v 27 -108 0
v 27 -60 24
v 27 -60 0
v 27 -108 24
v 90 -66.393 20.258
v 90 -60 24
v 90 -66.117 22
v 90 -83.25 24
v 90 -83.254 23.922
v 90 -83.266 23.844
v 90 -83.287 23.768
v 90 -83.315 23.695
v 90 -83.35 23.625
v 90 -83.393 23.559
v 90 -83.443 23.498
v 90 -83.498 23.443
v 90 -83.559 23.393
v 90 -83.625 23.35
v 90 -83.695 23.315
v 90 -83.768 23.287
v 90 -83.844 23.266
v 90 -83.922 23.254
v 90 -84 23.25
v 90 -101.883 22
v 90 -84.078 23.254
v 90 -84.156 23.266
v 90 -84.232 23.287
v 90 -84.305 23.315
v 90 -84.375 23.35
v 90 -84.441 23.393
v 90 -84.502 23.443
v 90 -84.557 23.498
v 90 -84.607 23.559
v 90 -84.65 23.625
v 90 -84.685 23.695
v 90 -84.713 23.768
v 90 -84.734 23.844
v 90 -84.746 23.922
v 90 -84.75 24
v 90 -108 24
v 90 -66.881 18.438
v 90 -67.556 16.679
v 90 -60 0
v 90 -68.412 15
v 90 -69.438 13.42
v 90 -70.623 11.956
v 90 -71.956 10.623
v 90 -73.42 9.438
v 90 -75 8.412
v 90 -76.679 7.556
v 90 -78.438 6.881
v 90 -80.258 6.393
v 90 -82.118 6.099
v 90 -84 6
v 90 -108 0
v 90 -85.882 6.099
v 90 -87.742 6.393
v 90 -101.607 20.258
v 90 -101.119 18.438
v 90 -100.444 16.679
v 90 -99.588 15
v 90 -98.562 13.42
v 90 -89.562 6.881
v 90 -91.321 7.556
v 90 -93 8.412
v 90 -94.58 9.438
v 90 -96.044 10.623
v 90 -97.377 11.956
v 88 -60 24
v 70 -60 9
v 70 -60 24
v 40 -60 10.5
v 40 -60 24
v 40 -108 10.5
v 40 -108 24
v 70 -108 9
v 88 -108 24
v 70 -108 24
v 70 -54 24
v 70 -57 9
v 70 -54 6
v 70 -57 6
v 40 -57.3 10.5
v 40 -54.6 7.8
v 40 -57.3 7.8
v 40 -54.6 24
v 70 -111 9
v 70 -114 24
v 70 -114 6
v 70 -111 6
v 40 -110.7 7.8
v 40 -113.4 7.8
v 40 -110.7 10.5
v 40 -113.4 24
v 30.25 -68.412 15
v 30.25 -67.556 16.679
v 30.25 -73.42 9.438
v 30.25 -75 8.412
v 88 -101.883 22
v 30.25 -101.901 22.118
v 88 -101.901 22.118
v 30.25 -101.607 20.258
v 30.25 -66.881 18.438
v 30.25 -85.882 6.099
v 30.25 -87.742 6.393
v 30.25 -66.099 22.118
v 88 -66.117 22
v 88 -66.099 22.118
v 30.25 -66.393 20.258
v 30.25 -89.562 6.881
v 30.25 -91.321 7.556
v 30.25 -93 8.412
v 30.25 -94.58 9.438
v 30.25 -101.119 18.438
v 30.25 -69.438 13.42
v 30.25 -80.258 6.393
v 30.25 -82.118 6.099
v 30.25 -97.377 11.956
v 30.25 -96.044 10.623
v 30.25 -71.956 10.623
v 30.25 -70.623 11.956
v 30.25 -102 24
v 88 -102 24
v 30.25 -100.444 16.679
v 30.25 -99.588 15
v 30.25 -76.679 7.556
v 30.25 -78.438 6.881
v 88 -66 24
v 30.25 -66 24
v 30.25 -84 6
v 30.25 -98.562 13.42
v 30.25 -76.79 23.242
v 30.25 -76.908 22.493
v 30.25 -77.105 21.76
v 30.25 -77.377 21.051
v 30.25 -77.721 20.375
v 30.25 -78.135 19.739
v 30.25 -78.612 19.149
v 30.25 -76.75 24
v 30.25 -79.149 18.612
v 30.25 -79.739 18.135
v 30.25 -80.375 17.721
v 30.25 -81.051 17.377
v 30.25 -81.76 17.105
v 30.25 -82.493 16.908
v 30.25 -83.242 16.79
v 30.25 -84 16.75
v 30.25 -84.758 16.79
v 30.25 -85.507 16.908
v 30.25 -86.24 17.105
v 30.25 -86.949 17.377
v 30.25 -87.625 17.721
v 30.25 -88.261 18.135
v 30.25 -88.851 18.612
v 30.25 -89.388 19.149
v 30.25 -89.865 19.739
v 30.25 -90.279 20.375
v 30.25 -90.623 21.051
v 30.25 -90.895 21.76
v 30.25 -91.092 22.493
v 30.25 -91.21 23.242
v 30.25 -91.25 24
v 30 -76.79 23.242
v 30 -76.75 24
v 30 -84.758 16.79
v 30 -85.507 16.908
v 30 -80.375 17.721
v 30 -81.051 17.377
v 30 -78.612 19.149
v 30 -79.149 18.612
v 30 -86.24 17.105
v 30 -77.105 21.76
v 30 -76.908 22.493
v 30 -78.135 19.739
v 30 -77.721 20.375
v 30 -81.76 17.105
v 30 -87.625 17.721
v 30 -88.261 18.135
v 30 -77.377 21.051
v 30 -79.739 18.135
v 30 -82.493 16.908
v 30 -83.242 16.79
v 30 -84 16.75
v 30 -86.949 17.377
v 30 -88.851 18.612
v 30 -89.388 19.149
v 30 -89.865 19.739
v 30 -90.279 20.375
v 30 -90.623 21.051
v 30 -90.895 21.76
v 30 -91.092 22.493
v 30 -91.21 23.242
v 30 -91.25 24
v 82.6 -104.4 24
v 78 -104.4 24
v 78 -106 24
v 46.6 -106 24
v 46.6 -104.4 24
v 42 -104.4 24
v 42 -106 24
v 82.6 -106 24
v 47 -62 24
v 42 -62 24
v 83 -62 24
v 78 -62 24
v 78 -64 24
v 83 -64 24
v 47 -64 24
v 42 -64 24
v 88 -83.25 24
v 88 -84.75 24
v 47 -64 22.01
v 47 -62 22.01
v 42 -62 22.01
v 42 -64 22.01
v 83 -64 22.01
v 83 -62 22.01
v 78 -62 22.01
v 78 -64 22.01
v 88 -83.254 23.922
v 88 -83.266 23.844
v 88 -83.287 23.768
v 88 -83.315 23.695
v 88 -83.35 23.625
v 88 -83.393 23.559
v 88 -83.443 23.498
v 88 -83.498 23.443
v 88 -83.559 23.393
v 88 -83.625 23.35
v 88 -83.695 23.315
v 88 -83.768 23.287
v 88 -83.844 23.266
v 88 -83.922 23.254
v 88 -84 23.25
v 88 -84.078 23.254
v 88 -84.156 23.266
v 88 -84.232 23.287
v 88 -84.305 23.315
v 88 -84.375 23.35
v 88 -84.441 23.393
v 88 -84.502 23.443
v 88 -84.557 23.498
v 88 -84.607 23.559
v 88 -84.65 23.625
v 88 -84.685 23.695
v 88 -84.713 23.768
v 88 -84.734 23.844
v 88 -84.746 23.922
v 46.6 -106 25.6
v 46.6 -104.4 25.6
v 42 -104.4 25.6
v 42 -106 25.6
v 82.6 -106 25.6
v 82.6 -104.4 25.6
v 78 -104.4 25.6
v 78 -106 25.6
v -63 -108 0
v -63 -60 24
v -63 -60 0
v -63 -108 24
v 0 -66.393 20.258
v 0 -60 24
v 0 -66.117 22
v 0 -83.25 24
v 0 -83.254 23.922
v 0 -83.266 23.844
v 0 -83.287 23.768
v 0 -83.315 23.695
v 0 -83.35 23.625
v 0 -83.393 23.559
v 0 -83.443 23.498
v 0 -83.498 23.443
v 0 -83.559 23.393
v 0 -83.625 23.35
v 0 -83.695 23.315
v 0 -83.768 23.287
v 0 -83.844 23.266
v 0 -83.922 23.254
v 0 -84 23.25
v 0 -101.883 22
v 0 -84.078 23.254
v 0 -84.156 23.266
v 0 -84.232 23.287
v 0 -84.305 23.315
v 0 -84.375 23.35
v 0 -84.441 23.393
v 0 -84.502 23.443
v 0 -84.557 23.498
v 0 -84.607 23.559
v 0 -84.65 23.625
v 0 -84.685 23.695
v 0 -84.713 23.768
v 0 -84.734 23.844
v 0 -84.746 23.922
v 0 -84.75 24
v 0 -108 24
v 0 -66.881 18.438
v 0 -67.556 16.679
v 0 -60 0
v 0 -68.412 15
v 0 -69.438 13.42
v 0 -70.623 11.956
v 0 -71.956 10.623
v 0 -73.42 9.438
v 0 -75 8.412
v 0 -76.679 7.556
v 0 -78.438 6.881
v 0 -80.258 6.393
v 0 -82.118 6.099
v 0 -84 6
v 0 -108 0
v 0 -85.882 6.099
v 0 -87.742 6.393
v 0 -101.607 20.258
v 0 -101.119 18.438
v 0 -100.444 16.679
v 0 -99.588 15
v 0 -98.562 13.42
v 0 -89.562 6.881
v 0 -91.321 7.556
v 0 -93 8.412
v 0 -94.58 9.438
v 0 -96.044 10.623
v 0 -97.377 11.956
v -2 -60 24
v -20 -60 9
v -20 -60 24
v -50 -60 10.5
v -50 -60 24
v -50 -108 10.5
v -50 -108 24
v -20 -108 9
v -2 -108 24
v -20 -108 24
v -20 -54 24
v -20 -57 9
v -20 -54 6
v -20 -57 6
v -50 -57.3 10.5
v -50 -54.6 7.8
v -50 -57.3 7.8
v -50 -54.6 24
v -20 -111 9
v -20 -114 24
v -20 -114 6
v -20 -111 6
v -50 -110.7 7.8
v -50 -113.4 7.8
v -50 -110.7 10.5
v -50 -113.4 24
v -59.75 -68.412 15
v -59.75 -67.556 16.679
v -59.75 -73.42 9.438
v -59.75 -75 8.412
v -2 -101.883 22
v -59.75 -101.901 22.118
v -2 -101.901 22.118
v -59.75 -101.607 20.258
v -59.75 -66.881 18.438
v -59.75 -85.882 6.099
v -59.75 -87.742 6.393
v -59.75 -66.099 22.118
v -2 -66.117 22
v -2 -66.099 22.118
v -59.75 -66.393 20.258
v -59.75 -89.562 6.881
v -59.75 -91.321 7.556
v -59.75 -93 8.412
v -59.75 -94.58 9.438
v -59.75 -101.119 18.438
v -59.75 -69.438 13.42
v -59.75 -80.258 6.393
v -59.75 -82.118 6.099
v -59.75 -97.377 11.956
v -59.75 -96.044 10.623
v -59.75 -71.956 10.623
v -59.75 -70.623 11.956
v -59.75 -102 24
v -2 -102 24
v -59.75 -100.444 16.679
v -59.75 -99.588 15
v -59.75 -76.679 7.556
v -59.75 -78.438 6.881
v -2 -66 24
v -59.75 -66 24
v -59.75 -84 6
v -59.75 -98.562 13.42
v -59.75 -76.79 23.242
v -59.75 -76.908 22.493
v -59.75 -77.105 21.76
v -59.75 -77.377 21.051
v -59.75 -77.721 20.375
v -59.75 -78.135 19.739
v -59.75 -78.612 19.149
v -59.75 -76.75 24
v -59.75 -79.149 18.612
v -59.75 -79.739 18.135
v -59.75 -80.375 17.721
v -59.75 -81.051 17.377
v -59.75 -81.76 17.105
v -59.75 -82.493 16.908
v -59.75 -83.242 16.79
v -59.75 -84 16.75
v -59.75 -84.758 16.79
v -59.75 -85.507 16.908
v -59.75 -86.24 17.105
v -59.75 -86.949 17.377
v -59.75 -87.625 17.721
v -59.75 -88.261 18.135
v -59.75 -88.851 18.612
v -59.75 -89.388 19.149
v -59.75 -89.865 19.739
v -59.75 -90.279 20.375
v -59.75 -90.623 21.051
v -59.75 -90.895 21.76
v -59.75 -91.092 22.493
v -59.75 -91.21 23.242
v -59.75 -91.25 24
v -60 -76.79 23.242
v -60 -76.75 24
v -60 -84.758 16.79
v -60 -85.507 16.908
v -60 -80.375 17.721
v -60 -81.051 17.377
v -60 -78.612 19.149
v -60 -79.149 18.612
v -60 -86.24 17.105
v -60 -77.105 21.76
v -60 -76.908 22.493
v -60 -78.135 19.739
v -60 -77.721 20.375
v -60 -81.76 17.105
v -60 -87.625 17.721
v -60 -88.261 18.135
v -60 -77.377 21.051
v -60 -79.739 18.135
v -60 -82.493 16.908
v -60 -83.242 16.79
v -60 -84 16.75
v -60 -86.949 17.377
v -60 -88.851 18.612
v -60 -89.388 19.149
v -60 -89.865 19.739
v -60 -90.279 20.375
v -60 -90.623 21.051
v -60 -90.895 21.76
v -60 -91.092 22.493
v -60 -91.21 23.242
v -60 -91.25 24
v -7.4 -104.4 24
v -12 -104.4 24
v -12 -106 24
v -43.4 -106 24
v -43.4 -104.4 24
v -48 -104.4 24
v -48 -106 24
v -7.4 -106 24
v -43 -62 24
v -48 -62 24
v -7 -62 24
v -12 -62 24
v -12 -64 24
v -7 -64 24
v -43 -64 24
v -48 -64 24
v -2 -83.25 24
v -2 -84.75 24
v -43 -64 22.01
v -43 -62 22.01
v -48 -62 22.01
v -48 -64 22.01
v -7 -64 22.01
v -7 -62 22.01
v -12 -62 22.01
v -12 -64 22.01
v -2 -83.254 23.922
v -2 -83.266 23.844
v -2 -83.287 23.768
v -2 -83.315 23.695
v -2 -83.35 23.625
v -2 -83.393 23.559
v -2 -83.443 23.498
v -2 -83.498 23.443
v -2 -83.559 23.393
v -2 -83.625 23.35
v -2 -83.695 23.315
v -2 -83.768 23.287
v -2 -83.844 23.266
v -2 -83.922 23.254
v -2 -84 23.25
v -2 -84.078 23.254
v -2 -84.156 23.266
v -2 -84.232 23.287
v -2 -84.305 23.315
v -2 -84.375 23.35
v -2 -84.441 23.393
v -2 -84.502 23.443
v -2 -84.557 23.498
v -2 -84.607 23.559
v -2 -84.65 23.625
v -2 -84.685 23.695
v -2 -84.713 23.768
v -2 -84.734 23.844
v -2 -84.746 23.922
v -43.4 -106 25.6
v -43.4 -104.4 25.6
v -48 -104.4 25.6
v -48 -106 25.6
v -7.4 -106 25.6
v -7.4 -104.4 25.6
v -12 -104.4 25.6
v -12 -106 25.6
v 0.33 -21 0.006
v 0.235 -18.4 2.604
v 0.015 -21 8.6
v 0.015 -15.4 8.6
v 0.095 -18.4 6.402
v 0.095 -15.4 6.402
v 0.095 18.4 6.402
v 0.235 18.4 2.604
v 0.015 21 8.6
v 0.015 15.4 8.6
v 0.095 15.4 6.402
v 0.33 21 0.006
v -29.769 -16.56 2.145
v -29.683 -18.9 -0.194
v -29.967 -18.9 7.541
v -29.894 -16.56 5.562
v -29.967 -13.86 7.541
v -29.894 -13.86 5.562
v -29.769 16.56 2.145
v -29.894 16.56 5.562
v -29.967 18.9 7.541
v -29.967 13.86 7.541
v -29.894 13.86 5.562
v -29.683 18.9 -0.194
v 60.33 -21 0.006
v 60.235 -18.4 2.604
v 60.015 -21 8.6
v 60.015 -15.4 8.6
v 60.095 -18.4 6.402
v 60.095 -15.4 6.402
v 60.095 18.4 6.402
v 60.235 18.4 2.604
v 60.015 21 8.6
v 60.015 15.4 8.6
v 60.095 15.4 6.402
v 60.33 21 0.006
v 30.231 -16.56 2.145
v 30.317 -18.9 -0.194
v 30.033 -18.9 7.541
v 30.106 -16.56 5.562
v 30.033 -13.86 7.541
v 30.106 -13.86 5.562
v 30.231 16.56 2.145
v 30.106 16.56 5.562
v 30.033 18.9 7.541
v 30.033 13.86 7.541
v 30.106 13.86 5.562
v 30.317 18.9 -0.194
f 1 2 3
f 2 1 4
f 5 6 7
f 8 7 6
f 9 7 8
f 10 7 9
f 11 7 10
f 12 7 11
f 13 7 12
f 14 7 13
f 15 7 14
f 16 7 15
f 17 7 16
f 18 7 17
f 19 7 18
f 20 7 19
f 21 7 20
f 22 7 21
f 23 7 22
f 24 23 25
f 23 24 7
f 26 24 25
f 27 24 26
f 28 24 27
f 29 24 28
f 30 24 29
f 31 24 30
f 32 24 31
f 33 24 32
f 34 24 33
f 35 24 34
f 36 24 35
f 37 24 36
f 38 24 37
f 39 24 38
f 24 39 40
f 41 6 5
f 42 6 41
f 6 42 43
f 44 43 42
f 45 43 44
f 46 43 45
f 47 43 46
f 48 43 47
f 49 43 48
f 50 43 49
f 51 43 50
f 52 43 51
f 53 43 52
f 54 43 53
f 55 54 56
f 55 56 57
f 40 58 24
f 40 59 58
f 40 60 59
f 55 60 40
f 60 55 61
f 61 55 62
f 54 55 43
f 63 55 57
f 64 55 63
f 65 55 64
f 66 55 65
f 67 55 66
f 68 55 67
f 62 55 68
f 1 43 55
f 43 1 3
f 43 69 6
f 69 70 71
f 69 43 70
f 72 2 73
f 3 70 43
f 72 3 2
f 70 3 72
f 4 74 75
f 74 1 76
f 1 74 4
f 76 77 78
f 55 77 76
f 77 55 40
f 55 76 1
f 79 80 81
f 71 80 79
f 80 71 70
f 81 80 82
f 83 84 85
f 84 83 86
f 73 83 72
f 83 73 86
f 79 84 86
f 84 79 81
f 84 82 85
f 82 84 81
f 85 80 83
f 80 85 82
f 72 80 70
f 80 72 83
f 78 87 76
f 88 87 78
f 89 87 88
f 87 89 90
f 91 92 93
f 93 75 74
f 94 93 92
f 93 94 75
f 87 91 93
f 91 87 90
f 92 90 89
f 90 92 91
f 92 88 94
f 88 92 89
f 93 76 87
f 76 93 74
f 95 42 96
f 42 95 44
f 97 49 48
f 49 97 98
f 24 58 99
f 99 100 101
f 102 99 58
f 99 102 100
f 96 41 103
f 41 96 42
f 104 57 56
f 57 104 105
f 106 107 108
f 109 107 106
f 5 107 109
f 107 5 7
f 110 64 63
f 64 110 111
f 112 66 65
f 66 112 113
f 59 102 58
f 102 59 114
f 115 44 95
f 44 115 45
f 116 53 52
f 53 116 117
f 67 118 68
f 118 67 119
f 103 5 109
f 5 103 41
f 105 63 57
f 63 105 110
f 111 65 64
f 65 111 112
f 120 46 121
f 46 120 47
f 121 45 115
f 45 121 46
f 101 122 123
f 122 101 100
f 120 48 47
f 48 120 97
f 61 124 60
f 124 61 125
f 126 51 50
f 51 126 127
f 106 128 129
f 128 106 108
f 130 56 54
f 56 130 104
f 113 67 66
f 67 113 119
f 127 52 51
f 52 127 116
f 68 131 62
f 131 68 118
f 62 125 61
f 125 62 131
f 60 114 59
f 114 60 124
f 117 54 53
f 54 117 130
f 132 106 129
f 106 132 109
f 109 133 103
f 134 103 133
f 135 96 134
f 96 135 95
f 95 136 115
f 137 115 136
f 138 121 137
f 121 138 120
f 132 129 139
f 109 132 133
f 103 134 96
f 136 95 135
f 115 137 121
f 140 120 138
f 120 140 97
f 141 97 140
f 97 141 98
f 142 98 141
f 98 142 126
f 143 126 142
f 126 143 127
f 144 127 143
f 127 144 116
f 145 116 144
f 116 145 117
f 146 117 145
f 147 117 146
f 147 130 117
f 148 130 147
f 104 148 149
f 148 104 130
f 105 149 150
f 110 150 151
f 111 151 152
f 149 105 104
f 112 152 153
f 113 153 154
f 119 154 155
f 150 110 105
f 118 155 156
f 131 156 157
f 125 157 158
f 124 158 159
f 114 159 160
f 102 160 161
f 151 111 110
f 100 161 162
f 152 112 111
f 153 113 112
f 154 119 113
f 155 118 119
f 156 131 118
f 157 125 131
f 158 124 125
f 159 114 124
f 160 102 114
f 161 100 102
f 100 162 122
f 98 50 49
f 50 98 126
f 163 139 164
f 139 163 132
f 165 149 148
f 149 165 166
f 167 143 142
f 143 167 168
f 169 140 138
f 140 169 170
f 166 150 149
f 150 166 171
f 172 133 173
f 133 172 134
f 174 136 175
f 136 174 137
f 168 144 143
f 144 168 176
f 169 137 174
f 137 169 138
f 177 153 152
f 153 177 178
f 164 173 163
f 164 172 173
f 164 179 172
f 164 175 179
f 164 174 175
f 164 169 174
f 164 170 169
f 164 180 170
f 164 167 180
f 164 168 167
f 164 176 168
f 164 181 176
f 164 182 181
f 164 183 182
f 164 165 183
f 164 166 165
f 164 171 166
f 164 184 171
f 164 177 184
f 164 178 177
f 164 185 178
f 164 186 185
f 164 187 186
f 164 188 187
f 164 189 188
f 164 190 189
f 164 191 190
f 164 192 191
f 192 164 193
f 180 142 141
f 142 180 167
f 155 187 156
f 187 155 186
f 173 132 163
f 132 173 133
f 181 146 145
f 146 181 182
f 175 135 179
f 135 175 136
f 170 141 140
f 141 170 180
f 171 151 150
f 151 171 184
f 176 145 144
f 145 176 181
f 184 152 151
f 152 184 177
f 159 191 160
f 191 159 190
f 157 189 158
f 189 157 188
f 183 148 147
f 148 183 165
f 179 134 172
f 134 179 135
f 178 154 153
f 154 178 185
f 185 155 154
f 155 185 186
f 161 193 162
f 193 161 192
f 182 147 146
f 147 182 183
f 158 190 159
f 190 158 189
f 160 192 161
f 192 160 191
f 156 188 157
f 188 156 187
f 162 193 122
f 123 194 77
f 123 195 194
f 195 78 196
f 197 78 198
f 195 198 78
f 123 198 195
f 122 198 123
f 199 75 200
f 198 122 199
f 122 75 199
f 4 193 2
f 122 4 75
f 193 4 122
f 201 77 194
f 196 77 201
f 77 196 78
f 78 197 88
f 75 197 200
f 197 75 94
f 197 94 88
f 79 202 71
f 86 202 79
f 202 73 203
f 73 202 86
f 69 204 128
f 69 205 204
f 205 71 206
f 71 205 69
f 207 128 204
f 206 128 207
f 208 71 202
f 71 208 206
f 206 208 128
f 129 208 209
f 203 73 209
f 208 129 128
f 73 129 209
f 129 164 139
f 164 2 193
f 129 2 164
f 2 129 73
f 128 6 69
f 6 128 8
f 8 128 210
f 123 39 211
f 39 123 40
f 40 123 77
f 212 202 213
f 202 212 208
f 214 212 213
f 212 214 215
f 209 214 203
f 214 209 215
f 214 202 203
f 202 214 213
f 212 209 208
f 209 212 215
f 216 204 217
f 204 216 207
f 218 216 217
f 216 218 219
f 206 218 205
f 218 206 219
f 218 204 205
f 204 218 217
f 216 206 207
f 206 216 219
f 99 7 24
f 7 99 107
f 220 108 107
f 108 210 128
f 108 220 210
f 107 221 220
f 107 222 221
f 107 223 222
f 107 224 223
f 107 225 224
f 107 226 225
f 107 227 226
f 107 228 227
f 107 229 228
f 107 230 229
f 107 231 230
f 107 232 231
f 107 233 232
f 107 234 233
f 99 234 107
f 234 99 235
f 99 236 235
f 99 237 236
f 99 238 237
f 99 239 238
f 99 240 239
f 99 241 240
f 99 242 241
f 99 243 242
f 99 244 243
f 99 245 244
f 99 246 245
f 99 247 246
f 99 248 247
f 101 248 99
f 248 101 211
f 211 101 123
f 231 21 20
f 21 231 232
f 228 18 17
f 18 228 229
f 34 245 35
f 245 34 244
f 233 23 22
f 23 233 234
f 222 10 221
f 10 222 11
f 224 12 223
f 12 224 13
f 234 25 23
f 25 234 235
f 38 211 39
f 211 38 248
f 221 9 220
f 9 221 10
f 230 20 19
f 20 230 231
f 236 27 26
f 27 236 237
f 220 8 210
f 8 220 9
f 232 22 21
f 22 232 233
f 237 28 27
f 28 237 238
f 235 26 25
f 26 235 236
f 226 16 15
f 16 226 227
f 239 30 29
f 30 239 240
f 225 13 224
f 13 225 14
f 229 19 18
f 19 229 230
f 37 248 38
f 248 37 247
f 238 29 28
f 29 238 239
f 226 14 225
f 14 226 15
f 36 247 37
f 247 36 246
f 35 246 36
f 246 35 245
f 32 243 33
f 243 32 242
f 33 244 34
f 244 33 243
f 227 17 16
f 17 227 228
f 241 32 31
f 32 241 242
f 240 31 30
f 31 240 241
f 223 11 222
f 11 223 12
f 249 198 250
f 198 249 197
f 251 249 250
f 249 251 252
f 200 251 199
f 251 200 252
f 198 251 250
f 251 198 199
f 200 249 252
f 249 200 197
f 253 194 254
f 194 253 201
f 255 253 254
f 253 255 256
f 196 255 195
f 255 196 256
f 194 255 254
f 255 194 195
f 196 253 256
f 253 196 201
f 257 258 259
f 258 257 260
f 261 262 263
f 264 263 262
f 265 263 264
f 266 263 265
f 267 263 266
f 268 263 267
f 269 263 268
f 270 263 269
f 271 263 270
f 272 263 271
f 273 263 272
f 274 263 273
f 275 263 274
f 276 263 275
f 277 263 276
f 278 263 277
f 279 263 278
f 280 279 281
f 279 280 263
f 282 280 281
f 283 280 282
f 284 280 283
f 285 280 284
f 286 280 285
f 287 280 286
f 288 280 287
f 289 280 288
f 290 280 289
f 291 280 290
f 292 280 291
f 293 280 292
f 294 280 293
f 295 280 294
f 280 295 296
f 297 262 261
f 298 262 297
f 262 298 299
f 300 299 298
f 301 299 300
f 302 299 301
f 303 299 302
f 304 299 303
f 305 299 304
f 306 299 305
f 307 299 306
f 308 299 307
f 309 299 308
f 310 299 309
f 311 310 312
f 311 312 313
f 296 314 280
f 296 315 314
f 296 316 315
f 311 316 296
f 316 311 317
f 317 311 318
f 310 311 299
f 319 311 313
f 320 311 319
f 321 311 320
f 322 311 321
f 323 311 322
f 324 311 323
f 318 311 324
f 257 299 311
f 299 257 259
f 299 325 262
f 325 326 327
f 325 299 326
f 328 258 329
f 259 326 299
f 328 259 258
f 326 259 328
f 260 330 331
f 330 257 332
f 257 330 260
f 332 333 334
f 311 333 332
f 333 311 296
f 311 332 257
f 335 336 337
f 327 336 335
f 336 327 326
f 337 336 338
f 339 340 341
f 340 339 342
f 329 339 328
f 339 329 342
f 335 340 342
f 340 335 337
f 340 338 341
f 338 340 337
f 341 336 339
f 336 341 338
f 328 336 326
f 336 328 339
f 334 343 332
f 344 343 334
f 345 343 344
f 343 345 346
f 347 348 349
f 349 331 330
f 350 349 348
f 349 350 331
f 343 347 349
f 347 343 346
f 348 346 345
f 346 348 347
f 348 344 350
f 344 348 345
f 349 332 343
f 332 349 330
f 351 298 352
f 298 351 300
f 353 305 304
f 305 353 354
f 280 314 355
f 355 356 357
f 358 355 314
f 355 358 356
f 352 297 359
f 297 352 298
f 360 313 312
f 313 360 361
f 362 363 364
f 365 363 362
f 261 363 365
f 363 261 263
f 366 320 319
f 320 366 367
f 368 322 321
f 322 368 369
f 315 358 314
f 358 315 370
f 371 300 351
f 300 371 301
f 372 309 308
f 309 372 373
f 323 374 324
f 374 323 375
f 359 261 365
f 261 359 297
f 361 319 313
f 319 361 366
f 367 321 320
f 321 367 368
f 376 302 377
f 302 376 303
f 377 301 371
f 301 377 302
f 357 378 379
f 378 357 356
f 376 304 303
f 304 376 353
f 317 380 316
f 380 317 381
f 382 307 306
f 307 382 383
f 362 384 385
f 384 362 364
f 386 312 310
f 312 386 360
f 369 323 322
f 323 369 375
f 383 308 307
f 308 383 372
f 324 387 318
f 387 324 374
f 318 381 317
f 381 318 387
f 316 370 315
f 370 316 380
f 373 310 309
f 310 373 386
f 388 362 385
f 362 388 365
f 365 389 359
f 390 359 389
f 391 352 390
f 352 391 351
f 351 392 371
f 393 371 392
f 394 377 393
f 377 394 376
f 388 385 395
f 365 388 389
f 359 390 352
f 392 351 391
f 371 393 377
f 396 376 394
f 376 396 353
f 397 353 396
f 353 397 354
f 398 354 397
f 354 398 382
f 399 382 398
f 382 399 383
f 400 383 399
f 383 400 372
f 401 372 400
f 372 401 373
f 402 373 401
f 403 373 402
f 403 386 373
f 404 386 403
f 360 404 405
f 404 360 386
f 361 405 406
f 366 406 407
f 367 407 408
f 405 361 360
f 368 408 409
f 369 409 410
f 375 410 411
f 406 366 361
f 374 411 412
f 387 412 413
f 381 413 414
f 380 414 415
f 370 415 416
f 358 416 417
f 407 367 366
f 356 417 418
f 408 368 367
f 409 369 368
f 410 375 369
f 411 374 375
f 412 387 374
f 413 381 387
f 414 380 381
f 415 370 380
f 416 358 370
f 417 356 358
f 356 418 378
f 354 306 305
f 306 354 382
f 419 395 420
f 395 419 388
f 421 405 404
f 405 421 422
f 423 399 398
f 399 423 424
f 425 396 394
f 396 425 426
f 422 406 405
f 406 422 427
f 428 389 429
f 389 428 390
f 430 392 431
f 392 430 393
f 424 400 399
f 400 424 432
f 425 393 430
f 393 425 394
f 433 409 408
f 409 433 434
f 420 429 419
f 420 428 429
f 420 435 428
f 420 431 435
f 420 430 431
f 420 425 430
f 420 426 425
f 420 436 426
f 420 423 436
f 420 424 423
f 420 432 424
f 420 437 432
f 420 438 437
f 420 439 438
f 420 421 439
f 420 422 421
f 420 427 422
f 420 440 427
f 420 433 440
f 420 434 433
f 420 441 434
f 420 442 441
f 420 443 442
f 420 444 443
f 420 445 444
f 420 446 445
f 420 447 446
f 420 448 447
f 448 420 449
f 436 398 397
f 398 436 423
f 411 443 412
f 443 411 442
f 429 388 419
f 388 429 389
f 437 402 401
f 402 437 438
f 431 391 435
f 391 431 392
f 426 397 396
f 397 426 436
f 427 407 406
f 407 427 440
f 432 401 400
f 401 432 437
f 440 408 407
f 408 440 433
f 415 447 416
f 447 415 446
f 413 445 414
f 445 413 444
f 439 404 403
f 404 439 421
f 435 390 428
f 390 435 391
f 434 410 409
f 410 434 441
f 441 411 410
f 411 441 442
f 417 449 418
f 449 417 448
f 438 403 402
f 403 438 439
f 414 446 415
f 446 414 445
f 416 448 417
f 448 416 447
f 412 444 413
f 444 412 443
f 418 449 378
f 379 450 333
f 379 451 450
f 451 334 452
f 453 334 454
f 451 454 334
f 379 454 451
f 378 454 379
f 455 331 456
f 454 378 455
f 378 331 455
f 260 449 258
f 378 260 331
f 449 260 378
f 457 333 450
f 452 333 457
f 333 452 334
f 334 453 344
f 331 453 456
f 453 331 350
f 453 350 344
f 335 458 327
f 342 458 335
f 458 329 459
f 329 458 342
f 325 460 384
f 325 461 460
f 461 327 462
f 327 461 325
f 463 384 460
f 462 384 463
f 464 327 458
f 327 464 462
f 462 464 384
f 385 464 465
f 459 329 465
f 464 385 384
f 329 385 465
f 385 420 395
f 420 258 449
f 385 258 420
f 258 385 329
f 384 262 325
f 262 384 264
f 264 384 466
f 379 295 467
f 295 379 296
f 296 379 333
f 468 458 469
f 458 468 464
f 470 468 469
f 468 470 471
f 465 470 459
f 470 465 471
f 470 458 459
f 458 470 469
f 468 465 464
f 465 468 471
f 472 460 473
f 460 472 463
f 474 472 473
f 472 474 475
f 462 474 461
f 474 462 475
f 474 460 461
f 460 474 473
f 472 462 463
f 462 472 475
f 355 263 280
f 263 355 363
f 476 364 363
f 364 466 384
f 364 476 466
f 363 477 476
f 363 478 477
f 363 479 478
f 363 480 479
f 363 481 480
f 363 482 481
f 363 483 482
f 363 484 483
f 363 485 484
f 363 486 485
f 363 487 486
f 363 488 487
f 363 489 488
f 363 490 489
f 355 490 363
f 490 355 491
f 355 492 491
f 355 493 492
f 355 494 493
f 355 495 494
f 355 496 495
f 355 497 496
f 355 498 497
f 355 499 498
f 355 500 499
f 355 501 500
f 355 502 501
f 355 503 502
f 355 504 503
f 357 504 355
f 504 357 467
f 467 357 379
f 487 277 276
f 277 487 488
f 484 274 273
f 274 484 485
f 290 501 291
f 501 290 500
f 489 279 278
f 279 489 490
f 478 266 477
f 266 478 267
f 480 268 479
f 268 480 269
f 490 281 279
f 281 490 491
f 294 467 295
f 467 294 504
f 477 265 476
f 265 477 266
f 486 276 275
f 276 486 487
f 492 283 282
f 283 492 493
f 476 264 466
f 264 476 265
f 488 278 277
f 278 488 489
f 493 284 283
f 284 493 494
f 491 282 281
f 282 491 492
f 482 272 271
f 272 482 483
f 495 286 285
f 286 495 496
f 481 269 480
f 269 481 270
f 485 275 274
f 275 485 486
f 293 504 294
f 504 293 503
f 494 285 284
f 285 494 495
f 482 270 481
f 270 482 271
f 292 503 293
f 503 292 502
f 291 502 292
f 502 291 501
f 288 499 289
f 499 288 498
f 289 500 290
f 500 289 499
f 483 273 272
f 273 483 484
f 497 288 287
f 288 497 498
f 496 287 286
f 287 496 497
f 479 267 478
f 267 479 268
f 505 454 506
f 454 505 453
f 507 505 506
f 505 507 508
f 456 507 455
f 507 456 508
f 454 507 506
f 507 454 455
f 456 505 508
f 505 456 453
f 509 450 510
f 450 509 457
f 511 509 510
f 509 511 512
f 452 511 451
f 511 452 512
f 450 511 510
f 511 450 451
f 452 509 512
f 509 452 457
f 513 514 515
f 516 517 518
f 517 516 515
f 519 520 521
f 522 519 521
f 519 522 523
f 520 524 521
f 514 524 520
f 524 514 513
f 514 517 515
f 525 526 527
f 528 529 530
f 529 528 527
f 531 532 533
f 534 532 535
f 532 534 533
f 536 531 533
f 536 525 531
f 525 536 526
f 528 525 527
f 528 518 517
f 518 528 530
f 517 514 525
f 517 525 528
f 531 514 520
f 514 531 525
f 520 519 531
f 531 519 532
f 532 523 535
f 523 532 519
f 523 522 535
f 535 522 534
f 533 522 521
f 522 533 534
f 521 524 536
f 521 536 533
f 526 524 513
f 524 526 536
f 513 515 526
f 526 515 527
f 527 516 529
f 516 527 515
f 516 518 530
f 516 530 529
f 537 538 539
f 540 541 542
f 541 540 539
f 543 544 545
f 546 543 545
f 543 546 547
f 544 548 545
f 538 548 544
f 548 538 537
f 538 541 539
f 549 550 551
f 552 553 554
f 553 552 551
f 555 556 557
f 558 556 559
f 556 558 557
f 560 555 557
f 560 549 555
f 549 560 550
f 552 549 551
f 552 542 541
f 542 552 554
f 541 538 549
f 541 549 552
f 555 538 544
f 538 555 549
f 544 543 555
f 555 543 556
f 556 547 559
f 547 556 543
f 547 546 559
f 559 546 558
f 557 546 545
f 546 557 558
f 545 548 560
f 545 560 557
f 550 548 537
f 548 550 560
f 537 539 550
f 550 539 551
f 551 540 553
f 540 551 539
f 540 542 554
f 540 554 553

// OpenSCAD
$fn = 60;
candleHeight = 60;
candleDiameter = 36;
wallWidth = 6;
wickWidth = 1.5;
cleatOffset = 3;
reduction = 0.90;
wickBaseThickness = 0.5;
wickBaseDiameter = 14.5;
gap = 0.4;

module candle(height, diameter) {
    cylinder(h = height, r = diameter/2);
    translate([0,0,height-wickBaseThickness/2])
        cylinder(h = wickBaseThickness, d = wickBaseDiameter);
}

module cleatReceiver(cleatOffset, reduction) {
linear_extrude(height = candleHeight/2, scale = reduction)
    polygon([[candleDiameter/2-cleatOffset,0],
             [candleDiameter/2-cleatOffset,cleatOffset],
             [candleDiameter/2,cleatOffset],
             [candleDiameter/2,cleatOffset*2],
             [-(candleDiameter/2),cleatOffset*2],
             [-(candleDiameter/2),cleatOffset],
             [-(candleDiameter/2-cleatOffset),cleatOffset],
             [-(candleDiameter/2-cleatOffset),0]]);
}

module cleat(cleatOffset, reduction, gap) {
linear_extrude(height = candleHeight/2, scale = reduction)
    polygon([[candleDiameter/2-cleatOffset+gap,gap],
             [candleDiameter/2-cleatOffset+gap,cleatOffset-gap],
             [candleDiameter/2+gap,cleatOffset-gap],
             [candleDiameter/2+gap,cleatOffset*2+gap],
             [-(candleDiameter/2+gap),cleatOffset*2+gap],
             [-(candleDiameter/2+gap),cleatOffset-gap],
             [-(candleDiameter/2-cleatOffset+gap),cleatOffset-gap],
             [-(candleDiameter/2-cleatOffset+gap),gap],
             [-(candleDiameter/2+cleatOffset),gap],
             [-(candleDiameter/2+cleatOffset),cleatOffset*3],
             [(candleDiameter/2+cleatOffset),cleatOffset*3],
             [(candleDiameter/2+cleatOffset),gap]
    ]);
}

module blockWithReceiver(candleDiameter,
                         candleHeight,
                         wallWidth,
                         cleatOffset,
                         reduction) {
    cube([candleDiameter + wallWidth*2, candleDiameter+wallWidth*2, candleHeight+wallWidth/2]);
    translate([candleDiameter/2 + wallWidth,
               candleDiameter+wallWidth*2, 
               candleHeight/3])
        cleatReceiver(cleatOffset, reduction);
    translate([candleDiameter/2 + wallWidth,
               0, 
               candleHeight/3])
        rotate([0,0,180])
            cleatReceiver(cleatOffset, reduction);
}

module halfMold(candleDiameter,
              candleHeight,
              wallWidth,
              wickWidth,
              cleatOffset,
              reduction) {
    studWidth = 2;
    studLength = 5;
    difference() {
        rotate([0,-90,0])
            blockWithReceiver(candleDiameter,
                              candleHeight,
                              wallWidth,
                              cleatOffset,
                              reduction);
        translate([-1.5*candleHeight, 
                   -cleatOffset*3, 
                   candleDiameter/2+wallWidth])
            cube([candleHeight*2, 
                  candleDiameter*4, candleDiameter *2]);
        translate([0.25, 
                   candleDiameter/2+wallWidth,
                   candleDiameter/2+wallWidth])
            rotate([0, -90, 0])
                candle(candleHeight, candleDiameter);
        // Lower stud hole
        translate([-(4/5*candleHeight),
                  candleDiameter+1.5*wallWidth-studWidth/2,
                  candleDiameter/2 + wallWidth-1.99])
            cube([5,studWidth,2.01]);
        // Upper stud hole
        translate([-(1/5*candleHeight),
                  candleDiameter+1.5*wallWidth-studWidth/2,
                  candleDiameter/2 + wallWidth-1.99])
            cube([5,studWidth,2.01]);
    }
    // Lower stud
    translate([-(4/5*candleHeight),
              (wallWidth-studWidth)/2,
              candleDiameter/2 + wallWidth])
        cube([studLength-gap,studWidth-gap,2-gap]);
    // Upper stud
    translate([-(1/5*candleHeight),
              (wallWidth-studWidth)/2,
              candleDiameter/2 + wallWidth])
        cube([studLength-gap,studWidth-gap,2-gap]);
    // Wick brace
    braceThickness = 2;
    translate([-braceThickness, 0, 
        (candleDiameter/2 + wallWidth - braceThickness)])
        difference() {
            cube([braceThickness,
                candleDiameter+2*wallWidth,
                braceThickness]);
            translate([-0.1, candleDiameter/2+wallWidth,
                braceThickness])
                rotate([0, 90, 0])
                    cylinder(braceThickness + 0.5, 
                        d = wickWidth);
        }
}

module holder(candleHeight, candleDiameter, cleatOffset, gap, wallWidth) {
    difference() {
        linear_extrude(height = candleHeight/2,
            scale=0.6)
            square([candleDiameter+2*(2*cleatOffset+wallWidth+2*gap) + candleHeight,
                candleDiameter+2*(wallWidth+2*gap)+candleHeight],
                center=true);
        translate([0,0, candleHeight/4+wallWidth/2])
            cube([candleDiameter+2*(2*cleatOffset+wallWidth+2*gap),
                candleDiameter+2*(wallWidth+2*gap),
                candleHeight/2], center=true);
    }
}

translate([1.5*candleHeight, -3*candleDiameter, 0])
    halfMold(candleDiameter,
                  candleHeight,
                  wallWidth,
                  wickWidth,
                  cleatOffset,
                  reduction);

translate([0, -3*candleDiameter, 0])
    halfMold(candleDiameter,
                  candleHeight,
                  wallWidth,
                  wickWidth,
                  cleatOffset,
                  reduction);

translate([0, 0, 3*cleatOffset])
    rotate([-90, -2.1, 0])
        rotate([0, -90, 0])
            cleat(cleatOffset, reduction, gap); 
            
translate([candleHeight, 0, 3*cleatOffset])
    rotate([-90, -2.1, 0])
        rotate([0, -90, 0])
            cleat(cleatOffset, reduction, gap); 
